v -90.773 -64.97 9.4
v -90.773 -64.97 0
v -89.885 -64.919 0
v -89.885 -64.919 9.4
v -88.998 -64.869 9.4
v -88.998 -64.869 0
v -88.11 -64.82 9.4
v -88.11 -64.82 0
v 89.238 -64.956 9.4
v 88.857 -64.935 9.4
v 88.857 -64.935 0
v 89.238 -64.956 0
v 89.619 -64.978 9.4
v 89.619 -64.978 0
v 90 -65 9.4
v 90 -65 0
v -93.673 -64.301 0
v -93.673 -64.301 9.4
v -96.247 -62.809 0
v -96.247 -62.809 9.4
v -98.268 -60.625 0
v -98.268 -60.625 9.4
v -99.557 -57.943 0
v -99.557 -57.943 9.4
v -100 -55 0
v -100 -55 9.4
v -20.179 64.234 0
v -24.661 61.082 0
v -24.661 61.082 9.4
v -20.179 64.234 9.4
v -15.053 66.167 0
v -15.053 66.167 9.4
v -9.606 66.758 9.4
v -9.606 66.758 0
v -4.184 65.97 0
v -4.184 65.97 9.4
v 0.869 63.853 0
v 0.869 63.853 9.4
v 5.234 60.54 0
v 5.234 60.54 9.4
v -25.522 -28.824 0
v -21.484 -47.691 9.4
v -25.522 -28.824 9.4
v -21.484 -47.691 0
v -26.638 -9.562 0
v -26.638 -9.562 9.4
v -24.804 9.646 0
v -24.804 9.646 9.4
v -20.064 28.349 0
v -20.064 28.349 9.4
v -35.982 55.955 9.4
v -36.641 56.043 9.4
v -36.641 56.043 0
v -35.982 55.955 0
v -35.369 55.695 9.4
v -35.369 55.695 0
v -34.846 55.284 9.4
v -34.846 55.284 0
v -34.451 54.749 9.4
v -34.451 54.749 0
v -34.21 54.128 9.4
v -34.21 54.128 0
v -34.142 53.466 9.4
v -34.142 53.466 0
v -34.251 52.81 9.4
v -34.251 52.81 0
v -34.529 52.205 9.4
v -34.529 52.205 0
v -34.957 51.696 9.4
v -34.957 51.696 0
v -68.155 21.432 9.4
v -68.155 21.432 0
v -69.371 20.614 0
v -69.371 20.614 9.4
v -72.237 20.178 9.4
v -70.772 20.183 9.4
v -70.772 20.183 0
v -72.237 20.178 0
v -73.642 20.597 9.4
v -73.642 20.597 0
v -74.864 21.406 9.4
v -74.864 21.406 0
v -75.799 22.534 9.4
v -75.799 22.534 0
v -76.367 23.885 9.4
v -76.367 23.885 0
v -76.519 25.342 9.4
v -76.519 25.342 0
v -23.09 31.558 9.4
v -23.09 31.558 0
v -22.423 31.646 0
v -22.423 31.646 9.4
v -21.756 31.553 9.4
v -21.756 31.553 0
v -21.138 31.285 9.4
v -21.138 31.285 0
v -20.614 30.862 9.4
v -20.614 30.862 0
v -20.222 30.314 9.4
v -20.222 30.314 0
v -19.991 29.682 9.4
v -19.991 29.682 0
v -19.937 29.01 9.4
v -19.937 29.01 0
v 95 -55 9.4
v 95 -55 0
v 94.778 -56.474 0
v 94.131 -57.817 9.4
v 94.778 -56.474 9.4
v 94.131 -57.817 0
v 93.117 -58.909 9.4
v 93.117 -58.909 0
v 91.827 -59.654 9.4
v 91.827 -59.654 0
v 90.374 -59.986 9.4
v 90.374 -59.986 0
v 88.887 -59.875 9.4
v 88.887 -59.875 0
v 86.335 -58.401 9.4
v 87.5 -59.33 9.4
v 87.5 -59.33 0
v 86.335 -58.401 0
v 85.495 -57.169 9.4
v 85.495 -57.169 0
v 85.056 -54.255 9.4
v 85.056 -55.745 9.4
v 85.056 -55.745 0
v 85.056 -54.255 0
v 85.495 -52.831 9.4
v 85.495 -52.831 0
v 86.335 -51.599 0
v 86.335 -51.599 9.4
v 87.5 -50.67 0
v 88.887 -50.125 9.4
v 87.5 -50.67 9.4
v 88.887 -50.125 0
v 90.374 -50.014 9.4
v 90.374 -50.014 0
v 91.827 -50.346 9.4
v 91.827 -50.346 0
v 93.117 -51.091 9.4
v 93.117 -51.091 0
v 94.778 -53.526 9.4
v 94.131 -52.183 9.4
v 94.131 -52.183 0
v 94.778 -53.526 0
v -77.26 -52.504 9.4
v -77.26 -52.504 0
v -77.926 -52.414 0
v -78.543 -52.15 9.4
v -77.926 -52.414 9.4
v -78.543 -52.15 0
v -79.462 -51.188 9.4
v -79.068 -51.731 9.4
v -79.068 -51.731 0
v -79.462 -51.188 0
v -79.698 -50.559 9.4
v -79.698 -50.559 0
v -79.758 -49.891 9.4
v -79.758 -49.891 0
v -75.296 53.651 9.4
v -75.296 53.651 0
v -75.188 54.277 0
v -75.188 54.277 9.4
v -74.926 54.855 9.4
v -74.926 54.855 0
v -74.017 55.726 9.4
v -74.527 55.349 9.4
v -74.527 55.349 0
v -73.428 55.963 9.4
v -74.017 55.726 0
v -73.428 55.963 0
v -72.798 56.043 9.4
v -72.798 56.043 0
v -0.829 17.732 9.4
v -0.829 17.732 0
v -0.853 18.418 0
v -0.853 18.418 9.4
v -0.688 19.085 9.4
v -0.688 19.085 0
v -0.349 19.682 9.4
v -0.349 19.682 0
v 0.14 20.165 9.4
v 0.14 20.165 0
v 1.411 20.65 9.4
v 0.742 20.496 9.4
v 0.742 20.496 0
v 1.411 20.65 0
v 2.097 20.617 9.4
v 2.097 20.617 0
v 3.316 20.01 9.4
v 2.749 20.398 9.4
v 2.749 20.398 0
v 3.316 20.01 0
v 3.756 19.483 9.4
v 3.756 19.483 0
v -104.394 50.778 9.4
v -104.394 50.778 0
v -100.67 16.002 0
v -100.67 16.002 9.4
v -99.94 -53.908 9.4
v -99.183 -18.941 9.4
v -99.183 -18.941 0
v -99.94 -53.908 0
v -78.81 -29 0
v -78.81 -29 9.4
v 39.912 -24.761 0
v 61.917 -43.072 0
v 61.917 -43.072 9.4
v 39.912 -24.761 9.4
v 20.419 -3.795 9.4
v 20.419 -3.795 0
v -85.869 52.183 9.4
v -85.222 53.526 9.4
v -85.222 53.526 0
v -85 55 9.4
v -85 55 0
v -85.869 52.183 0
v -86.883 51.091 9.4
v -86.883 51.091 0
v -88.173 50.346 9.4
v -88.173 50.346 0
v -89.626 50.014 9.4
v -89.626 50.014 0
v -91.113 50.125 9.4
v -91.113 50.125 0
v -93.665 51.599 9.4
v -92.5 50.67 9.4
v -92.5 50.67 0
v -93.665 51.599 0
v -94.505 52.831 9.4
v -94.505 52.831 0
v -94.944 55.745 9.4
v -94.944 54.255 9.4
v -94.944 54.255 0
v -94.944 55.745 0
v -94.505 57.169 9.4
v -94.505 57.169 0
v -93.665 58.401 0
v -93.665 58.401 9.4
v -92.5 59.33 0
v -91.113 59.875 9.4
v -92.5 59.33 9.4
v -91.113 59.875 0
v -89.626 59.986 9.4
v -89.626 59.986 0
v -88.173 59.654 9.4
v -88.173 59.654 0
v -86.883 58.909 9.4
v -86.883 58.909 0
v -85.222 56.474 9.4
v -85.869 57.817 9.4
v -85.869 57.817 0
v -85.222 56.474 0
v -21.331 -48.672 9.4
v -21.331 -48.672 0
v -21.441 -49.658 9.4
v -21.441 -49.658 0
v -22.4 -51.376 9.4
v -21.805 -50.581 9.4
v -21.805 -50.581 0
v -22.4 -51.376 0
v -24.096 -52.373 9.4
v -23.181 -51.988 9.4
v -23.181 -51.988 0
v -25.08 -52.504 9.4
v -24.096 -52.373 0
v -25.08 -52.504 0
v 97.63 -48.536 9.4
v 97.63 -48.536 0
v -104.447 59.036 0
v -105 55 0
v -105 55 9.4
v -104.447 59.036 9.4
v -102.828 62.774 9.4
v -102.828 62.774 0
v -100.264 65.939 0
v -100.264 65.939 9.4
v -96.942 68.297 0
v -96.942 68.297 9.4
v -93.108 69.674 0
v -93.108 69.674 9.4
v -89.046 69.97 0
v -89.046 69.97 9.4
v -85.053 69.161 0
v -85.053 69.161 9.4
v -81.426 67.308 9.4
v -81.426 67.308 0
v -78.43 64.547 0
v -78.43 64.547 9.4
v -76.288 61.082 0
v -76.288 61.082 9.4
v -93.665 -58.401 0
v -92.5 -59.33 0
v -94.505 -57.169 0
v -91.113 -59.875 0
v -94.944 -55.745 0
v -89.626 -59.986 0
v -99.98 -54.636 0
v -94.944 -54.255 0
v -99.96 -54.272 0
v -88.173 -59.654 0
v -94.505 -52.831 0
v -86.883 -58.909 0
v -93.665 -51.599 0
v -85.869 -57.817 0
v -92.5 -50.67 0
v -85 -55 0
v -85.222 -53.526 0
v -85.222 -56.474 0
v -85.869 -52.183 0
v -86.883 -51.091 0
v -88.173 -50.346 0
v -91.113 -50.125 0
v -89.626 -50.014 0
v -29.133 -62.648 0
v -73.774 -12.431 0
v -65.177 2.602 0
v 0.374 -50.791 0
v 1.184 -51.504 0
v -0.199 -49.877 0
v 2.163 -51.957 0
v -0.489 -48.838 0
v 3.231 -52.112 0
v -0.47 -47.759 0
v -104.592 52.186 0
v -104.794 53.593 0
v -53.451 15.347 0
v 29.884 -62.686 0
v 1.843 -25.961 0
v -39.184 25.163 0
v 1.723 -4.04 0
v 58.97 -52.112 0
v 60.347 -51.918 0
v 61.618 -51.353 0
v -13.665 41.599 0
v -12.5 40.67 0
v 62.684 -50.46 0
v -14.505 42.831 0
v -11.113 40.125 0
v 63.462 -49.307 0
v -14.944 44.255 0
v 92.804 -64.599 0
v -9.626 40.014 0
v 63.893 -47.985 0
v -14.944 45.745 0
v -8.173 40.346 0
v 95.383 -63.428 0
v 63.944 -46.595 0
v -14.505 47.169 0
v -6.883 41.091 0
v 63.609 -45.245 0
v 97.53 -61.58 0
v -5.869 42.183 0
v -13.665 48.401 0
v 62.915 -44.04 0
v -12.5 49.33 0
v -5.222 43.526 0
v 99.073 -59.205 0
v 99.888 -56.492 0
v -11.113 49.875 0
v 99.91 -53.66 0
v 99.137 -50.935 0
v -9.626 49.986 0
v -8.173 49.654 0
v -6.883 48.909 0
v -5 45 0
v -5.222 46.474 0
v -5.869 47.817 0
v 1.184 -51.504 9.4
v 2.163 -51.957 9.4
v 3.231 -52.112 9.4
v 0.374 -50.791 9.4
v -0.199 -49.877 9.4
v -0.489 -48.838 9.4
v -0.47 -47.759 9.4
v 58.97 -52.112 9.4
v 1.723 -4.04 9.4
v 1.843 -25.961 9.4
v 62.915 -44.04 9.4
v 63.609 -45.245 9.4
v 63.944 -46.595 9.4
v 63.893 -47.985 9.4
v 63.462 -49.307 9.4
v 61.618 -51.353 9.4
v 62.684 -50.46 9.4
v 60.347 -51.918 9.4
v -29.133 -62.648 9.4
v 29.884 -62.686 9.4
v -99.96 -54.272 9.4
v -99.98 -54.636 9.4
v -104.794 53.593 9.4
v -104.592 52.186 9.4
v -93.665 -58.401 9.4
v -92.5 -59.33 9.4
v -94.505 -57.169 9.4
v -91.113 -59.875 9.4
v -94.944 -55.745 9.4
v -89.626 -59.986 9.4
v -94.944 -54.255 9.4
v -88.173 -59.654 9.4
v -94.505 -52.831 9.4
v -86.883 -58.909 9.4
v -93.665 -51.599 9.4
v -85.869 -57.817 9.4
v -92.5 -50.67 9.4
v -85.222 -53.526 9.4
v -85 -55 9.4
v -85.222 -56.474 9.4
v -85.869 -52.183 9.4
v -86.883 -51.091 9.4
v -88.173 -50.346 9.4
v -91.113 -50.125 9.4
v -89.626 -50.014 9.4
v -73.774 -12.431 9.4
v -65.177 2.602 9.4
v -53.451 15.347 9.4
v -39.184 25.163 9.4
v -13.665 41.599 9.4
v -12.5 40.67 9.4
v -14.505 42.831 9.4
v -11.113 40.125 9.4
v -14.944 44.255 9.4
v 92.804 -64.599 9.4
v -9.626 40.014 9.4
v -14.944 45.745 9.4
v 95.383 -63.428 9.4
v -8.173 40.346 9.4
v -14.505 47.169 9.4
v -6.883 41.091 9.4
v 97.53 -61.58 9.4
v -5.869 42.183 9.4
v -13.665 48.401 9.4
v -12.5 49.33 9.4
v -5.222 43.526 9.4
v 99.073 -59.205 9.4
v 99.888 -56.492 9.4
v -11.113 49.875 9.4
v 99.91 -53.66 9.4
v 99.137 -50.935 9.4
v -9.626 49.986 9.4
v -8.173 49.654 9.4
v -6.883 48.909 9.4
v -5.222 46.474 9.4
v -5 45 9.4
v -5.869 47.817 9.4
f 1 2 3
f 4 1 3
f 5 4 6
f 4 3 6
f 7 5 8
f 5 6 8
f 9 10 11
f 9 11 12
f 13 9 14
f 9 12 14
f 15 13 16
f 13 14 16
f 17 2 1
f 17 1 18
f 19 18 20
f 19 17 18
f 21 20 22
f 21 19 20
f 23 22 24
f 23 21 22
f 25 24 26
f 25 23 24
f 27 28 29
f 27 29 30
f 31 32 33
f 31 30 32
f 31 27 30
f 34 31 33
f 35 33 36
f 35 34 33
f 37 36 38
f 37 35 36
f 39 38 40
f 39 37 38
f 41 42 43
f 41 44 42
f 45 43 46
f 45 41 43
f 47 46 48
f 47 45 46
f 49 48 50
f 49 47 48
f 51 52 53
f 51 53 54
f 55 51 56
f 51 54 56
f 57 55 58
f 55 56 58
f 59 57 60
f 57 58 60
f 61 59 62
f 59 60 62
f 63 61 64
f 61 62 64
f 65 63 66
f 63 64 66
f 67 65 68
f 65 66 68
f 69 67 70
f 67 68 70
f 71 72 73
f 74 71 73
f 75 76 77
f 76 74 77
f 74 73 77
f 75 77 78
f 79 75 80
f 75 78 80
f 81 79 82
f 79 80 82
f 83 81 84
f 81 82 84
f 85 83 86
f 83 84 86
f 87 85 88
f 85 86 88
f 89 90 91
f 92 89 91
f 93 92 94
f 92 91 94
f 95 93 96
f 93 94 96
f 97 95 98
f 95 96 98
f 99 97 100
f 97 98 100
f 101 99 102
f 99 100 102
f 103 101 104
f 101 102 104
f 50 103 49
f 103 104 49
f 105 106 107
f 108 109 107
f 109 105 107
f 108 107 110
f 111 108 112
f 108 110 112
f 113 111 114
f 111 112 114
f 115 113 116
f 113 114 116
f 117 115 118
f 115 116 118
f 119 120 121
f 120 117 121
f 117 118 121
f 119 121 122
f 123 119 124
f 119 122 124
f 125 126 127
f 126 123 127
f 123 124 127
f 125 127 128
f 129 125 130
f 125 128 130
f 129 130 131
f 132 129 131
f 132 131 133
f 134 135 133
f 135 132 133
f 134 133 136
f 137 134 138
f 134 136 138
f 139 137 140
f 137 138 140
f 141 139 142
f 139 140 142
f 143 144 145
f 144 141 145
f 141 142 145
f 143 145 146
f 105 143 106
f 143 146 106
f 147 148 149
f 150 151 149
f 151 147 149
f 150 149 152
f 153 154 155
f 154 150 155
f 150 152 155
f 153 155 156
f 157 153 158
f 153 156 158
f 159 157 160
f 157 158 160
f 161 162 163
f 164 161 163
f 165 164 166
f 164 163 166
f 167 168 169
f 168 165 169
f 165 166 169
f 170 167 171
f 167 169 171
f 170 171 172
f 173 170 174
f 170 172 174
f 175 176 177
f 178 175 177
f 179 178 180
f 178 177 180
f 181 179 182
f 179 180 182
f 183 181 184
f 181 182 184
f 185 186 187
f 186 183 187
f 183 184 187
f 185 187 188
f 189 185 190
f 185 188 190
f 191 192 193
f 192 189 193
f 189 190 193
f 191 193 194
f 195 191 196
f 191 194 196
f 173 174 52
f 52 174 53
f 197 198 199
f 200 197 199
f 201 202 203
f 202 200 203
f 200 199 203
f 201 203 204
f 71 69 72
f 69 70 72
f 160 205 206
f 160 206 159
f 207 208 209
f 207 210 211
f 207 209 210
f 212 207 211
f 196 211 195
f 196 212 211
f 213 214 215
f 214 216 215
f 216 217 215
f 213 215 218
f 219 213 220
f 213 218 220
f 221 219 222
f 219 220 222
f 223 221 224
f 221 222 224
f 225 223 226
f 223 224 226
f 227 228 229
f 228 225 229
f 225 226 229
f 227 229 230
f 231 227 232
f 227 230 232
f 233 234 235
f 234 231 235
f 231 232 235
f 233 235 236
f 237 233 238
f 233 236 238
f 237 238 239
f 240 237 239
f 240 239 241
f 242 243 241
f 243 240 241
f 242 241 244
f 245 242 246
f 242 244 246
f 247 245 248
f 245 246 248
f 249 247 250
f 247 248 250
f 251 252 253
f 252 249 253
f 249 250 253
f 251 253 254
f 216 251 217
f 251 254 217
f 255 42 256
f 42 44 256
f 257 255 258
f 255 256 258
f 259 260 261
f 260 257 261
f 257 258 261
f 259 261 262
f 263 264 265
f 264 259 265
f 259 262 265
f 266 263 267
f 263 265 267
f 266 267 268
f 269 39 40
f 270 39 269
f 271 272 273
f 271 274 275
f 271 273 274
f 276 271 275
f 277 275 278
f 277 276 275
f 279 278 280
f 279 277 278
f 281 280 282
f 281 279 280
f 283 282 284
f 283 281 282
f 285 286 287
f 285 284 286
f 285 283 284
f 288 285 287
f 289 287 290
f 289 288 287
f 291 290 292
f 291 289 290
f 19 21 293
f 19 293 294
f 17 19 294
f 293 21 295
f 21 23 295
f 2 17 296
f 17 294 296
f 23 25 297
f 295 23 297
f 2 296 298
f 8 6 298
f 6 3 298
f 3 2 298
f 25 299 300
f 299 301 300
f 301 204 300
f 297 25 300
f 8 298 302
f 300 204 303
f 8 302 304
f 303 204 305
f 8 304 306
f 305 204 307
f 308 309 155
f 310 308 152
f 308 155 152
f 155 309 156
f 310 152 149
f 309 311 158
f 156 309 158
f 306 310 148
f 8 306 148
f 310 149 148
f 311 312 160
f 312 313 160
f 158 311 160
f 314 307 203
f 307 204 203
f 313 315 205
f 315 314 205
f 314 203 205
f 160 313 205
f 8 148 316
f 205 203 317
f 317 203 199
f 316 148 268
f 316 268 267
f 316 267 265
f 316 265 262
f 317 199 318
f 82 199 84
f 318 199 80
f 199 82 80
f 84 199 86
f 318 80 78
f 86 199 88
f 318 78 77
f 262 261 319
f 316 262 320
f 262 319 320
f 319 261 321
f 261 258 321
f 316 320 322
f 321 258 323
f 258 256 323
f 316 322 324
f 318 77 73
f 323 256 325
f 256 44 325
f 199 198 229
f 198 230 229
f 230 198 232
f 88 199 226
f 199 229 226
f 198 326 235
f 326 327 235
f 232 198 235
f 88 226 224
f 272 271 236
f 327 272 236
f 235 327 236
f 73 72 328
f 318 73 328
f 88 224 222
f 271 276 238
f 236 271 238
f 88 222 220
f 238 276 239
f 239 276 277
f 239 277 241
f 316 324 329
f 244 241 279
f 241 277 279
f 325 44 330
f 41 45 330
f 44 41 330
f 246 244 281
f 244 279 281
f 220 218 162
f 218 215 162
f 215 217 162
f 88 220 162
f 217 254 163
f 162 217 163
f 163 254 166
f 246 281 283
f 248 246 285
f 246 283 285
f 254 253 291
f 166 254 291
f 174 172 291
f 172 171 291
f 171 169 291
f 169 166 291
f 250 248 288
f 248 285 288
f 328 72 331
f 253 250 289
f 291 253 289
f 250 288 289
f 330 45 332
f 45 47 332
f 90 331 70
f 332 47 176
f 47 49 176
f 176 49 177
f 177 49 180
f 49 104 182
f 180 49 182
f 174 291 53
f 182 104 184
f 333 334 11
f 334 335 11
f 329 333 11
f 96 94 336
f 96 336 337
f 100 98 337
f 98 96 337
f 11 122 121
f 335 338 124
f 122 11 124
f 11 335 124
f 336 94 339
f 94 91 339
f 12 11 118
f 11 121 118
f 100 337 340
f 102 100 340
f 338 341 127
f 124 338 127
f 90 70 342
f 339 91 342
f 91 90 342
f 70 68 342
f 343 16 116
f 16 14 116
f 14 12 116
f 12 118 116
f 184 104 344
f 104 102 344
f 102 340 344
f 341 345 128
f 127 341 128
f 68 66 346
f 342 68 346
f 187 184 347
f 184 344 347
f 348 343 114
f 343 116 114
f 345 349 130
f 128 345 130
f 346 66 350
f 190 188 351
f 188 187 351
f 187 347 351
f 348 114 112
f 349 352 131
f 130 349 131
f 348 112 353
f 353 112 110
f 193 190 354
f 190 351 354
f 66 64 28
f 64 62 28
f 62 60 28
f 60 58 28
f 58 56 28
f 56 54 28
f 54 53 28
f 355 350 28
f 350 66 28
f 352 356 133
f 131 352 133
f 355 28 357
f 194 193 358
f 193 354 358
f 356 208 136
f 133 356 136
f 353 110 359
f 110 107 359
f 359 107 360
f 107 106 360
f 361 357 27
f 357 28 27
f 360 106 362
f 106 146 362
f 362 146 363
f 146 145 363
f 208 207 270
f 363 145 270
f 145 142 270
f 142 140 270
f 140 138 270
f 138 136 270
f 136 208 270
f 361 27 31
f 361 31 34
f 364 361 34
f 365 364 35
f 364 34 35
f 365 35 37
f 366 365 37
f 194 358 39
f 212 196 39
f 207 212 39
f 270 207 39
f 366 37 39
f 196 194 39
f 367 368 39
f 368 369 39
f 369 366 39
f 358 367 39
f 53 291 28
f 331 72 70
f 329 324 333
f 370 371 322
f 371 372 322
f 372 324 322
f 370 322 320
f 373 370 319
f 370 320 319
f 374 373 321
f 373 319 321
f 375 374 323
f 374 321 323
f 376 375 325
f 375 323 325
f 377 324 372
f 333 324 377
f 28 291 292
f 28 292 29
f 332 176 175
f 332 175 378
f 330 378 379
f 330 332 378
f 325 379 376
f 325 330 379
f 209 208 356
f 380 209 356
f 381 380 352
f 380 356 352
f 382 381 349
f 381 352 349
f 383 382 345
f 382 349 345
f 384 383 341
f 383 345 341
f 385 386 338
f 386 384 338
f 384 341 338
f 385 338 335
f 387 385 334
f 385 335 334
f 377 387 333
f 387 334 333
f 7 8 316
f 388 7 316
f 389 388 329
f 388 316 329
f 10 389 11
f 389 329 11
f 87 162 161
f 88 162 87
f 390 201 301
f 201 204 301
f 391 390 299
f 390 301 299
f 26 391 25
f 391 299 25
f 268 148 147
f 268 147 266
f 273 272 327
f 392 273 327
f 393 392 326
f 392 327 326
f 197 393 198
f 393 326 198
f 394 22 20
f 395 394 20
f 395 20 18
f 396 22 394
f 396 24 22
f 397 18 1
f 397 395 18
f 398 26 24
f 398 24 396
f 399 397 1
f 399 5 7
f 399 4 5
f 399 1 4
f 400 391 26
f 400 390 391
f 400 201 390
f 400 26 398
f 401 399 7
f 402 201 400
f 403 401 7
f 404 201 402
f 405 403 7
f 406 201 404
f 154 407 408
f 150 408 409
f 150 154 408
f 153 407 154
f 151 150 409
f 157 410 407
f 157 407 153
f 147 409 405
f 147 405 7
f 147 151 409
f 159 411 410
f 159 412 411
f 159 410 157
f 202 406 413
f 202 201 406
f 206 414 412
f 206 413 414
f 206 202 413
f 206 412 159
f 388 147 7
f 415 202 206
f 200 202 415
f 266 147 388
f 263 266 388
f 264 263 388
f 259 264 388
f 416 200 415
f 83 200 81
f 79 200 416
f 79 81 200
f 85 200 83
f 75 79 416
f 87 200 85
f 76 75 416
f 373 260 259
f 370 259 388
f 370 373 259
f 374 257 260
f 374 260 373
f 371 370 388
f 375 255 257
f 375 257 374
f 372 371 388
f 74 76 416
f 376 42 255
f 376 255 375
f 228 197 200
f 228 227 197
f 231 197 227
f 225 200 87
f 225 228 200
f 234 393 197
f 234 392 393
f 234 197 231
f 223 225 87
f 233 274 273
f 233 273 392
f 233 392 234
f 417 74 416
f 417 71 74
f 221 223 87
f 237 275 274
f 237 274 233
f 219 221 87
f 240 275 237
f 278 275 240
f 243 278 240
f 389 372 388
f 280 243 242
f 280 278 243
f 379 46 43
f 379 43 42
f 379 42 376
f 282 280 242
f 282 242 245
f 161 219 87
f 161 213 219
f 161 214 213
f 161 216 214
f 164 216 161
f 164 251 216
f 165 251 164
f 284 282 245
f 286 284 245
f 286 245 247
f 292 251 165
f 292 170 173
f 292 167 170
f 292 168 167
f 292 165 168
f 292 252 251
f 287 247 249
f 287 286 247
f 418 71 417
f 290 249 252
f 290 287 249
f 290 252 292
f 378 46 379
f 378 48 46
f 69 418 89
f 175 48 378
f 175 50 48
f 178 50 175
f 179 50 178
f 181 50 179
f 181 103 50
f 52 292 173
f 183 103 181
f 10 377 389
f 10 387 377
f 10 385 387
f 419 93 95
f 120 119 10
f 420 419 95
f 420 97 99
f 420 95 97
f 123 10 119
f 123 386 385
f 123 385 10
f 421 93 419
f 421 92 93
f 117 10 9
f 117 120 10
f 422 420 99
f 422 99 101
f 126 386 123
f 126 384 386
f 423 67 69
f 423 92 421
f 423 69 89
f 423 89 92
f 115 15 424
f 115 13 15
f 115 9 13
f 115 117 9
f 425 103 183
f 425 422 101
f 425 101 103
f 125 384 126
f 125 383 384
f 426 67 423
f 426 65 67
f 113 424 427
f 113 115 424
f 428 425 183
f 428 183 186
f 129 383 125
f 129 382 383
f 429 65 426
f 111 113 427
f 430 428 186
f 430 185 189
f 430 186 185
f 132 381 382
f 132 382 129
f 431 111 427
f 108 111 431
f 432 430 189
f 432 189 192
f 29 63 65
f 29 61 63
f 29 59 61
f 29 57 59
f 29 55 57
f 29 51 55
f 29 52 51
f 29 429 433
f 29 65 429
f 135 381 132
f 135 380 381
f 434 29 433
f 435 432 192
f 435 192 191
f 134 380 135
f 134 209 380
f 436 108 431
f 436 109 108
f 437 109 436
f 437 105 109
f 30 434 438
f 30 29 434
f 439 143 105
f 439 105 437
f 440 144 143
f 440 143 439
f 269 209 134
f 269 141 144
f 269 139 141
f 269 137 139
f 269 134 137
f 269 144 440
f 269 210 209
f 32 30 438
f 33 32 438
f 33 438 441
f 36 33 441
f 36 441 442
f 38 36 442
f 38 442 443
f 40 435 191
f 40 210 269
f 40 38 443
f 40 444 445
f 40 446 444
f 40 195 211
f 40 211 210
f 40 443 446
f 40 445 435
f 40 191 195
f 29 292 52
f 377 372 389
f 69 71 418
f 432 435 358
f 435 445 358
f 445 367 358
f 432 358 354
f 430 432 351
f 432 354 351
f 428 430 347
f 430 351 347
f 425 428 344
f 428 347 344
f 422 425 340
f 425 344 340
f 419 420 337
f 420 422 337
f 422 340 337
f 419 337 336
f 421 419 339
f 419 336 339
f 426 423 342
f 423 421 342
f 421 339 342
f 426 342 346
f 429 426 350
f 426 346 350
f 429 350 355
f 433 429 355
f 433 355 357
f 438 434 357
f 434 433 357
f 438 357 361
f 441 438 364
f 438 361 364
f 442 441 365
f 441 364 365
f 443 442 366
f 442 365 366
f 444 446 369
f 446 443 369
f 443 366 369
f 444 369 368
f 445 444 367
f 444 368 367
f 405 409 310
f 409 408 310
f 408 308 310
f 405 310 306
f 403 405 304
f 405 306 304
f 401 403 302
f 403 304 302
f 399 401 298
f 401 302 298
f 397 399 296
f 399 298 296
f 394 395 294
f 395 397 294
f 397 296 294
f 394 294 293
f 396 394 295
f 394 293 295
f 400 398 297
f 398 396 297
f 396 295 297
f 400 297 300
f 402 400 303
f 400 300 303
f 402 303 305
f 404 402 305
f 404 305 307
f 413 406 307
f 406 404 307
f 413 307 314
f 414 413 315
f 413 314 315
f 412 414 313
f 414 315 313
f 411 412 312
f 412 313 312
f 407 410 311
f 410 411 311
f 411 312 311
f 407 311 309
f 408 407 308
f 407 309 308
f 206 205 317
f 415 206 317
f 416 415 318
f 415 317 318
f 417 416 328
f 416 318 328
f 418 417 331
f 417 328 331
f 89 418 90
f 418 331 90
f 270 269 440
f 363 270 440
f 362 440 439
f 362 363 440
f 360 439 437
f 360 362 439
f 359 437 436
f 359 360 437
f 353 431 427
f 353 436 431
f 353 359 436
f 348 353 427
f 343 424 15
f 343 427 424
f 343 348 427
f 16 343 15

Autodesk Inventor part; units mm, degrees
ref_plane "YZ Plane" through (0, 0, 0) normal (1, 0, 0) x (0, 1, 0)
ref_plane "XZ Plane" through (0, 0, 0) normal (0, 1, 0) x (-1, 0, 0)
ref_plane "XY Plane" through (0, 0, 0) normal (0, 0, 1) x (1, 0, 0)
sketch "Sketch1" plane through (0, 0, 0) normal (0, 0, 1) x (1, 0, 0)
  line L0 (-110, 70) -> (110, 70) construction
  line L1 (110, 70) -> (110, -70) construction
  line L2 (110, -70) -> (-110, -70) construction
  line L3 (-110, -70) -> (-110, 70) construction
  circle A0 centre (-90, 55) radius 5
  circle A1 centre (-90, -55) radius 5
  circle A2 centre (90, -55) radius 5
  circle A3 centre (-10, 45) radius 5
  line L4 (-67, 0) -> (-42, 0) construction
  line L5 (-42, 0) -> (-42, -30) construction
  line L6 (-42, -30) -> (-67, -30) construction
  line L7 (-67, -30) -> (-67, 0) construction
  circle A4 centre (-54.5, -19) radius 10 construction
  arc A5 (-76.2883, 61.082) -> (-104.3936, 50.7781) centre (-90, 55) ccw
  arc A6 (-99.9402, -53.9078) -> (-88.1099, -64.8197) centre (-90, -55) ccw
  arc A7 (-100, -55) -> (-105, 55) centre (-644.4063, -24.6321) ccw
  line L8 (-34.9568, 51.6958) -> (-68.1552, 21.4315)
  line L9 (-75.2957, 53.6513) -> (-76.519, 25.3424)
  line L10 (-78.8103, -29) -> (-79.758, -49.8907)
  arc A8 (80, -54.9687) -> (97.6304, -48.5365) centre (90, -55) ccw
  line L11 (5.2335, 60.5405) -> (97.6304, -48.5365)
  arc A9 (5.2335, 60.5405) -> (-24.6607, 61.082) centre (-10, 45) ccw
  arc A10 (-76.519, 25.3424) -> (-68.1552, 21.4315) centre (-71.5236, 25.1265) ccw
  line L12 (-76.2883, 61.082) -> (-24.6607, 61.082)
  line L13 (-72.7981, 56.0433) -> (-36.641, 56.0433)
  arc A11 (-72.7981, 56.0433) -> (-75.2957, 53.6513) centre (-72.7981, 53.5433) ccw
  arc A12 (-34.9568, 51.6958) -> (-36.641, 56.0433) centre (-36.641, 53.5433) ccw
  arc A13 (90, -65) -> (-90.7731, -64.9701) centre (-0.647, -1637.996) ccw
  arc A14 (-20.0638, 28.3489) -> (-21.4839, -47.6911) centre (99.5478, -11.9183) ccw
  arc A15 (-0.4705, -47.7594) -> (-0.8289, 17.7317) centre (-195.1328, -16.0782) ccw
  circle A16 centre (-63.5274, -9.3914) radius 3 construction
  circle A17 centre (-57.919, -6.3914) radius 3 construction
  circle A18 centre (-51.0643, -6.3914) radius 3 construction
  circle A19 centre (-45.5038, -9.3914) radius 3 construction
  arc A20 (-23.0905, 31.5585) -> (-78.8103, -29) centre (-2.7481, -43.0717) ccw
  line L14 (-77.2605, -52.504) -> (-25.0801, -52.504)
  line L15 (3.2308, -52.1118) -> (58.9703, -52.1118)
  arc A21 (-20.0638, 28.3489) -> (-23.0905, 31.5585) centre (-22.4331, 29.1465) ccw
  arc A22 (3.7556, 19.4828) -> (-0.8289, 17.7317) centre (1.6341, 18.1603) ccw
  arc A23 (-0.4705, -47.7594) -> (3.2308, -52.1118) centre (3.2308, -48.3618) ccw
  arc A24 (-25.0801, -52.504) -> (-21.4839, -47.6911) centre (-25.0801, -48.754) ccw
  arc A25 (58.9703, -52.1118) -> (61.9167, -43.0722) centre (58.9703, -47.1118) ccw
  arc A26 (3.7556, 19.4828) -> (61.9167, -43.0722) centre (194.066, 138.1102) ccw
  arc A27 (75.297, -52.1118) -> (80, -54.9687) centre (194.066, 138.1102) ccw
  arc A28 (-79.758, -49.8907) -> (-77.2605, -52.504) centre (-77.2605, -50.004) ccw
  point P0 (0, 0)
  dimension "d1" = 70
  dimension "d2" = 70
  dimension "d3" = 110
  dimension "d4" = 110
  dimension "d5" = 10
  dimension "d6" = 10
  dimension "d7" = 10
  dimension "d8" = 10
  dimension "d9" = 55
  dimension "d10" = 55
  dimension "d11" = 55
  dimension "d12" = 180
  dimension "d13" = 90
  dimension "d15" = 10
  dimension "d16" = 45
  dimension "d17" = 42
  dimension "d18" = 30
  dimension "d19" = 0
  dimension "d20" = 25
  dimension "d21" = 20
  dimension "d25" = 19
  dimension "d26" = 12.5
  dimension "d67" = 90
  dimension "d68" = 30
  dimension "d70" = 20
  dimension "d71" = 20
  dimension "d74" = 10
  dimension "d75" = 5
  dimension "d76" = 5
  dimension "d77" = 6
  dimension "d78" = 6
  dimension "d79" = 6
  dimension "d80" = 6
  dimension "d81" = 5
  dimension "d82" = 5
  dimension "d83" = 7.5
  dimension "d84" = 7.5
  dimension "d85" = 10
  dimension "d88" = 5
extrude "Extrusion8" add sketch "Sketch1" along normal blind 9.4 contours L12 A9 L11 A8 A13 A6 A7 A5
equation "\"d1\" = d2"
equation "\"d4\" = d3"
equation "\"d10\" = d9"
equation "\"d11\" = d9"
equation "\"d26\" = 0.5 * d20"
properties part number "Bracket Concept MK10"
